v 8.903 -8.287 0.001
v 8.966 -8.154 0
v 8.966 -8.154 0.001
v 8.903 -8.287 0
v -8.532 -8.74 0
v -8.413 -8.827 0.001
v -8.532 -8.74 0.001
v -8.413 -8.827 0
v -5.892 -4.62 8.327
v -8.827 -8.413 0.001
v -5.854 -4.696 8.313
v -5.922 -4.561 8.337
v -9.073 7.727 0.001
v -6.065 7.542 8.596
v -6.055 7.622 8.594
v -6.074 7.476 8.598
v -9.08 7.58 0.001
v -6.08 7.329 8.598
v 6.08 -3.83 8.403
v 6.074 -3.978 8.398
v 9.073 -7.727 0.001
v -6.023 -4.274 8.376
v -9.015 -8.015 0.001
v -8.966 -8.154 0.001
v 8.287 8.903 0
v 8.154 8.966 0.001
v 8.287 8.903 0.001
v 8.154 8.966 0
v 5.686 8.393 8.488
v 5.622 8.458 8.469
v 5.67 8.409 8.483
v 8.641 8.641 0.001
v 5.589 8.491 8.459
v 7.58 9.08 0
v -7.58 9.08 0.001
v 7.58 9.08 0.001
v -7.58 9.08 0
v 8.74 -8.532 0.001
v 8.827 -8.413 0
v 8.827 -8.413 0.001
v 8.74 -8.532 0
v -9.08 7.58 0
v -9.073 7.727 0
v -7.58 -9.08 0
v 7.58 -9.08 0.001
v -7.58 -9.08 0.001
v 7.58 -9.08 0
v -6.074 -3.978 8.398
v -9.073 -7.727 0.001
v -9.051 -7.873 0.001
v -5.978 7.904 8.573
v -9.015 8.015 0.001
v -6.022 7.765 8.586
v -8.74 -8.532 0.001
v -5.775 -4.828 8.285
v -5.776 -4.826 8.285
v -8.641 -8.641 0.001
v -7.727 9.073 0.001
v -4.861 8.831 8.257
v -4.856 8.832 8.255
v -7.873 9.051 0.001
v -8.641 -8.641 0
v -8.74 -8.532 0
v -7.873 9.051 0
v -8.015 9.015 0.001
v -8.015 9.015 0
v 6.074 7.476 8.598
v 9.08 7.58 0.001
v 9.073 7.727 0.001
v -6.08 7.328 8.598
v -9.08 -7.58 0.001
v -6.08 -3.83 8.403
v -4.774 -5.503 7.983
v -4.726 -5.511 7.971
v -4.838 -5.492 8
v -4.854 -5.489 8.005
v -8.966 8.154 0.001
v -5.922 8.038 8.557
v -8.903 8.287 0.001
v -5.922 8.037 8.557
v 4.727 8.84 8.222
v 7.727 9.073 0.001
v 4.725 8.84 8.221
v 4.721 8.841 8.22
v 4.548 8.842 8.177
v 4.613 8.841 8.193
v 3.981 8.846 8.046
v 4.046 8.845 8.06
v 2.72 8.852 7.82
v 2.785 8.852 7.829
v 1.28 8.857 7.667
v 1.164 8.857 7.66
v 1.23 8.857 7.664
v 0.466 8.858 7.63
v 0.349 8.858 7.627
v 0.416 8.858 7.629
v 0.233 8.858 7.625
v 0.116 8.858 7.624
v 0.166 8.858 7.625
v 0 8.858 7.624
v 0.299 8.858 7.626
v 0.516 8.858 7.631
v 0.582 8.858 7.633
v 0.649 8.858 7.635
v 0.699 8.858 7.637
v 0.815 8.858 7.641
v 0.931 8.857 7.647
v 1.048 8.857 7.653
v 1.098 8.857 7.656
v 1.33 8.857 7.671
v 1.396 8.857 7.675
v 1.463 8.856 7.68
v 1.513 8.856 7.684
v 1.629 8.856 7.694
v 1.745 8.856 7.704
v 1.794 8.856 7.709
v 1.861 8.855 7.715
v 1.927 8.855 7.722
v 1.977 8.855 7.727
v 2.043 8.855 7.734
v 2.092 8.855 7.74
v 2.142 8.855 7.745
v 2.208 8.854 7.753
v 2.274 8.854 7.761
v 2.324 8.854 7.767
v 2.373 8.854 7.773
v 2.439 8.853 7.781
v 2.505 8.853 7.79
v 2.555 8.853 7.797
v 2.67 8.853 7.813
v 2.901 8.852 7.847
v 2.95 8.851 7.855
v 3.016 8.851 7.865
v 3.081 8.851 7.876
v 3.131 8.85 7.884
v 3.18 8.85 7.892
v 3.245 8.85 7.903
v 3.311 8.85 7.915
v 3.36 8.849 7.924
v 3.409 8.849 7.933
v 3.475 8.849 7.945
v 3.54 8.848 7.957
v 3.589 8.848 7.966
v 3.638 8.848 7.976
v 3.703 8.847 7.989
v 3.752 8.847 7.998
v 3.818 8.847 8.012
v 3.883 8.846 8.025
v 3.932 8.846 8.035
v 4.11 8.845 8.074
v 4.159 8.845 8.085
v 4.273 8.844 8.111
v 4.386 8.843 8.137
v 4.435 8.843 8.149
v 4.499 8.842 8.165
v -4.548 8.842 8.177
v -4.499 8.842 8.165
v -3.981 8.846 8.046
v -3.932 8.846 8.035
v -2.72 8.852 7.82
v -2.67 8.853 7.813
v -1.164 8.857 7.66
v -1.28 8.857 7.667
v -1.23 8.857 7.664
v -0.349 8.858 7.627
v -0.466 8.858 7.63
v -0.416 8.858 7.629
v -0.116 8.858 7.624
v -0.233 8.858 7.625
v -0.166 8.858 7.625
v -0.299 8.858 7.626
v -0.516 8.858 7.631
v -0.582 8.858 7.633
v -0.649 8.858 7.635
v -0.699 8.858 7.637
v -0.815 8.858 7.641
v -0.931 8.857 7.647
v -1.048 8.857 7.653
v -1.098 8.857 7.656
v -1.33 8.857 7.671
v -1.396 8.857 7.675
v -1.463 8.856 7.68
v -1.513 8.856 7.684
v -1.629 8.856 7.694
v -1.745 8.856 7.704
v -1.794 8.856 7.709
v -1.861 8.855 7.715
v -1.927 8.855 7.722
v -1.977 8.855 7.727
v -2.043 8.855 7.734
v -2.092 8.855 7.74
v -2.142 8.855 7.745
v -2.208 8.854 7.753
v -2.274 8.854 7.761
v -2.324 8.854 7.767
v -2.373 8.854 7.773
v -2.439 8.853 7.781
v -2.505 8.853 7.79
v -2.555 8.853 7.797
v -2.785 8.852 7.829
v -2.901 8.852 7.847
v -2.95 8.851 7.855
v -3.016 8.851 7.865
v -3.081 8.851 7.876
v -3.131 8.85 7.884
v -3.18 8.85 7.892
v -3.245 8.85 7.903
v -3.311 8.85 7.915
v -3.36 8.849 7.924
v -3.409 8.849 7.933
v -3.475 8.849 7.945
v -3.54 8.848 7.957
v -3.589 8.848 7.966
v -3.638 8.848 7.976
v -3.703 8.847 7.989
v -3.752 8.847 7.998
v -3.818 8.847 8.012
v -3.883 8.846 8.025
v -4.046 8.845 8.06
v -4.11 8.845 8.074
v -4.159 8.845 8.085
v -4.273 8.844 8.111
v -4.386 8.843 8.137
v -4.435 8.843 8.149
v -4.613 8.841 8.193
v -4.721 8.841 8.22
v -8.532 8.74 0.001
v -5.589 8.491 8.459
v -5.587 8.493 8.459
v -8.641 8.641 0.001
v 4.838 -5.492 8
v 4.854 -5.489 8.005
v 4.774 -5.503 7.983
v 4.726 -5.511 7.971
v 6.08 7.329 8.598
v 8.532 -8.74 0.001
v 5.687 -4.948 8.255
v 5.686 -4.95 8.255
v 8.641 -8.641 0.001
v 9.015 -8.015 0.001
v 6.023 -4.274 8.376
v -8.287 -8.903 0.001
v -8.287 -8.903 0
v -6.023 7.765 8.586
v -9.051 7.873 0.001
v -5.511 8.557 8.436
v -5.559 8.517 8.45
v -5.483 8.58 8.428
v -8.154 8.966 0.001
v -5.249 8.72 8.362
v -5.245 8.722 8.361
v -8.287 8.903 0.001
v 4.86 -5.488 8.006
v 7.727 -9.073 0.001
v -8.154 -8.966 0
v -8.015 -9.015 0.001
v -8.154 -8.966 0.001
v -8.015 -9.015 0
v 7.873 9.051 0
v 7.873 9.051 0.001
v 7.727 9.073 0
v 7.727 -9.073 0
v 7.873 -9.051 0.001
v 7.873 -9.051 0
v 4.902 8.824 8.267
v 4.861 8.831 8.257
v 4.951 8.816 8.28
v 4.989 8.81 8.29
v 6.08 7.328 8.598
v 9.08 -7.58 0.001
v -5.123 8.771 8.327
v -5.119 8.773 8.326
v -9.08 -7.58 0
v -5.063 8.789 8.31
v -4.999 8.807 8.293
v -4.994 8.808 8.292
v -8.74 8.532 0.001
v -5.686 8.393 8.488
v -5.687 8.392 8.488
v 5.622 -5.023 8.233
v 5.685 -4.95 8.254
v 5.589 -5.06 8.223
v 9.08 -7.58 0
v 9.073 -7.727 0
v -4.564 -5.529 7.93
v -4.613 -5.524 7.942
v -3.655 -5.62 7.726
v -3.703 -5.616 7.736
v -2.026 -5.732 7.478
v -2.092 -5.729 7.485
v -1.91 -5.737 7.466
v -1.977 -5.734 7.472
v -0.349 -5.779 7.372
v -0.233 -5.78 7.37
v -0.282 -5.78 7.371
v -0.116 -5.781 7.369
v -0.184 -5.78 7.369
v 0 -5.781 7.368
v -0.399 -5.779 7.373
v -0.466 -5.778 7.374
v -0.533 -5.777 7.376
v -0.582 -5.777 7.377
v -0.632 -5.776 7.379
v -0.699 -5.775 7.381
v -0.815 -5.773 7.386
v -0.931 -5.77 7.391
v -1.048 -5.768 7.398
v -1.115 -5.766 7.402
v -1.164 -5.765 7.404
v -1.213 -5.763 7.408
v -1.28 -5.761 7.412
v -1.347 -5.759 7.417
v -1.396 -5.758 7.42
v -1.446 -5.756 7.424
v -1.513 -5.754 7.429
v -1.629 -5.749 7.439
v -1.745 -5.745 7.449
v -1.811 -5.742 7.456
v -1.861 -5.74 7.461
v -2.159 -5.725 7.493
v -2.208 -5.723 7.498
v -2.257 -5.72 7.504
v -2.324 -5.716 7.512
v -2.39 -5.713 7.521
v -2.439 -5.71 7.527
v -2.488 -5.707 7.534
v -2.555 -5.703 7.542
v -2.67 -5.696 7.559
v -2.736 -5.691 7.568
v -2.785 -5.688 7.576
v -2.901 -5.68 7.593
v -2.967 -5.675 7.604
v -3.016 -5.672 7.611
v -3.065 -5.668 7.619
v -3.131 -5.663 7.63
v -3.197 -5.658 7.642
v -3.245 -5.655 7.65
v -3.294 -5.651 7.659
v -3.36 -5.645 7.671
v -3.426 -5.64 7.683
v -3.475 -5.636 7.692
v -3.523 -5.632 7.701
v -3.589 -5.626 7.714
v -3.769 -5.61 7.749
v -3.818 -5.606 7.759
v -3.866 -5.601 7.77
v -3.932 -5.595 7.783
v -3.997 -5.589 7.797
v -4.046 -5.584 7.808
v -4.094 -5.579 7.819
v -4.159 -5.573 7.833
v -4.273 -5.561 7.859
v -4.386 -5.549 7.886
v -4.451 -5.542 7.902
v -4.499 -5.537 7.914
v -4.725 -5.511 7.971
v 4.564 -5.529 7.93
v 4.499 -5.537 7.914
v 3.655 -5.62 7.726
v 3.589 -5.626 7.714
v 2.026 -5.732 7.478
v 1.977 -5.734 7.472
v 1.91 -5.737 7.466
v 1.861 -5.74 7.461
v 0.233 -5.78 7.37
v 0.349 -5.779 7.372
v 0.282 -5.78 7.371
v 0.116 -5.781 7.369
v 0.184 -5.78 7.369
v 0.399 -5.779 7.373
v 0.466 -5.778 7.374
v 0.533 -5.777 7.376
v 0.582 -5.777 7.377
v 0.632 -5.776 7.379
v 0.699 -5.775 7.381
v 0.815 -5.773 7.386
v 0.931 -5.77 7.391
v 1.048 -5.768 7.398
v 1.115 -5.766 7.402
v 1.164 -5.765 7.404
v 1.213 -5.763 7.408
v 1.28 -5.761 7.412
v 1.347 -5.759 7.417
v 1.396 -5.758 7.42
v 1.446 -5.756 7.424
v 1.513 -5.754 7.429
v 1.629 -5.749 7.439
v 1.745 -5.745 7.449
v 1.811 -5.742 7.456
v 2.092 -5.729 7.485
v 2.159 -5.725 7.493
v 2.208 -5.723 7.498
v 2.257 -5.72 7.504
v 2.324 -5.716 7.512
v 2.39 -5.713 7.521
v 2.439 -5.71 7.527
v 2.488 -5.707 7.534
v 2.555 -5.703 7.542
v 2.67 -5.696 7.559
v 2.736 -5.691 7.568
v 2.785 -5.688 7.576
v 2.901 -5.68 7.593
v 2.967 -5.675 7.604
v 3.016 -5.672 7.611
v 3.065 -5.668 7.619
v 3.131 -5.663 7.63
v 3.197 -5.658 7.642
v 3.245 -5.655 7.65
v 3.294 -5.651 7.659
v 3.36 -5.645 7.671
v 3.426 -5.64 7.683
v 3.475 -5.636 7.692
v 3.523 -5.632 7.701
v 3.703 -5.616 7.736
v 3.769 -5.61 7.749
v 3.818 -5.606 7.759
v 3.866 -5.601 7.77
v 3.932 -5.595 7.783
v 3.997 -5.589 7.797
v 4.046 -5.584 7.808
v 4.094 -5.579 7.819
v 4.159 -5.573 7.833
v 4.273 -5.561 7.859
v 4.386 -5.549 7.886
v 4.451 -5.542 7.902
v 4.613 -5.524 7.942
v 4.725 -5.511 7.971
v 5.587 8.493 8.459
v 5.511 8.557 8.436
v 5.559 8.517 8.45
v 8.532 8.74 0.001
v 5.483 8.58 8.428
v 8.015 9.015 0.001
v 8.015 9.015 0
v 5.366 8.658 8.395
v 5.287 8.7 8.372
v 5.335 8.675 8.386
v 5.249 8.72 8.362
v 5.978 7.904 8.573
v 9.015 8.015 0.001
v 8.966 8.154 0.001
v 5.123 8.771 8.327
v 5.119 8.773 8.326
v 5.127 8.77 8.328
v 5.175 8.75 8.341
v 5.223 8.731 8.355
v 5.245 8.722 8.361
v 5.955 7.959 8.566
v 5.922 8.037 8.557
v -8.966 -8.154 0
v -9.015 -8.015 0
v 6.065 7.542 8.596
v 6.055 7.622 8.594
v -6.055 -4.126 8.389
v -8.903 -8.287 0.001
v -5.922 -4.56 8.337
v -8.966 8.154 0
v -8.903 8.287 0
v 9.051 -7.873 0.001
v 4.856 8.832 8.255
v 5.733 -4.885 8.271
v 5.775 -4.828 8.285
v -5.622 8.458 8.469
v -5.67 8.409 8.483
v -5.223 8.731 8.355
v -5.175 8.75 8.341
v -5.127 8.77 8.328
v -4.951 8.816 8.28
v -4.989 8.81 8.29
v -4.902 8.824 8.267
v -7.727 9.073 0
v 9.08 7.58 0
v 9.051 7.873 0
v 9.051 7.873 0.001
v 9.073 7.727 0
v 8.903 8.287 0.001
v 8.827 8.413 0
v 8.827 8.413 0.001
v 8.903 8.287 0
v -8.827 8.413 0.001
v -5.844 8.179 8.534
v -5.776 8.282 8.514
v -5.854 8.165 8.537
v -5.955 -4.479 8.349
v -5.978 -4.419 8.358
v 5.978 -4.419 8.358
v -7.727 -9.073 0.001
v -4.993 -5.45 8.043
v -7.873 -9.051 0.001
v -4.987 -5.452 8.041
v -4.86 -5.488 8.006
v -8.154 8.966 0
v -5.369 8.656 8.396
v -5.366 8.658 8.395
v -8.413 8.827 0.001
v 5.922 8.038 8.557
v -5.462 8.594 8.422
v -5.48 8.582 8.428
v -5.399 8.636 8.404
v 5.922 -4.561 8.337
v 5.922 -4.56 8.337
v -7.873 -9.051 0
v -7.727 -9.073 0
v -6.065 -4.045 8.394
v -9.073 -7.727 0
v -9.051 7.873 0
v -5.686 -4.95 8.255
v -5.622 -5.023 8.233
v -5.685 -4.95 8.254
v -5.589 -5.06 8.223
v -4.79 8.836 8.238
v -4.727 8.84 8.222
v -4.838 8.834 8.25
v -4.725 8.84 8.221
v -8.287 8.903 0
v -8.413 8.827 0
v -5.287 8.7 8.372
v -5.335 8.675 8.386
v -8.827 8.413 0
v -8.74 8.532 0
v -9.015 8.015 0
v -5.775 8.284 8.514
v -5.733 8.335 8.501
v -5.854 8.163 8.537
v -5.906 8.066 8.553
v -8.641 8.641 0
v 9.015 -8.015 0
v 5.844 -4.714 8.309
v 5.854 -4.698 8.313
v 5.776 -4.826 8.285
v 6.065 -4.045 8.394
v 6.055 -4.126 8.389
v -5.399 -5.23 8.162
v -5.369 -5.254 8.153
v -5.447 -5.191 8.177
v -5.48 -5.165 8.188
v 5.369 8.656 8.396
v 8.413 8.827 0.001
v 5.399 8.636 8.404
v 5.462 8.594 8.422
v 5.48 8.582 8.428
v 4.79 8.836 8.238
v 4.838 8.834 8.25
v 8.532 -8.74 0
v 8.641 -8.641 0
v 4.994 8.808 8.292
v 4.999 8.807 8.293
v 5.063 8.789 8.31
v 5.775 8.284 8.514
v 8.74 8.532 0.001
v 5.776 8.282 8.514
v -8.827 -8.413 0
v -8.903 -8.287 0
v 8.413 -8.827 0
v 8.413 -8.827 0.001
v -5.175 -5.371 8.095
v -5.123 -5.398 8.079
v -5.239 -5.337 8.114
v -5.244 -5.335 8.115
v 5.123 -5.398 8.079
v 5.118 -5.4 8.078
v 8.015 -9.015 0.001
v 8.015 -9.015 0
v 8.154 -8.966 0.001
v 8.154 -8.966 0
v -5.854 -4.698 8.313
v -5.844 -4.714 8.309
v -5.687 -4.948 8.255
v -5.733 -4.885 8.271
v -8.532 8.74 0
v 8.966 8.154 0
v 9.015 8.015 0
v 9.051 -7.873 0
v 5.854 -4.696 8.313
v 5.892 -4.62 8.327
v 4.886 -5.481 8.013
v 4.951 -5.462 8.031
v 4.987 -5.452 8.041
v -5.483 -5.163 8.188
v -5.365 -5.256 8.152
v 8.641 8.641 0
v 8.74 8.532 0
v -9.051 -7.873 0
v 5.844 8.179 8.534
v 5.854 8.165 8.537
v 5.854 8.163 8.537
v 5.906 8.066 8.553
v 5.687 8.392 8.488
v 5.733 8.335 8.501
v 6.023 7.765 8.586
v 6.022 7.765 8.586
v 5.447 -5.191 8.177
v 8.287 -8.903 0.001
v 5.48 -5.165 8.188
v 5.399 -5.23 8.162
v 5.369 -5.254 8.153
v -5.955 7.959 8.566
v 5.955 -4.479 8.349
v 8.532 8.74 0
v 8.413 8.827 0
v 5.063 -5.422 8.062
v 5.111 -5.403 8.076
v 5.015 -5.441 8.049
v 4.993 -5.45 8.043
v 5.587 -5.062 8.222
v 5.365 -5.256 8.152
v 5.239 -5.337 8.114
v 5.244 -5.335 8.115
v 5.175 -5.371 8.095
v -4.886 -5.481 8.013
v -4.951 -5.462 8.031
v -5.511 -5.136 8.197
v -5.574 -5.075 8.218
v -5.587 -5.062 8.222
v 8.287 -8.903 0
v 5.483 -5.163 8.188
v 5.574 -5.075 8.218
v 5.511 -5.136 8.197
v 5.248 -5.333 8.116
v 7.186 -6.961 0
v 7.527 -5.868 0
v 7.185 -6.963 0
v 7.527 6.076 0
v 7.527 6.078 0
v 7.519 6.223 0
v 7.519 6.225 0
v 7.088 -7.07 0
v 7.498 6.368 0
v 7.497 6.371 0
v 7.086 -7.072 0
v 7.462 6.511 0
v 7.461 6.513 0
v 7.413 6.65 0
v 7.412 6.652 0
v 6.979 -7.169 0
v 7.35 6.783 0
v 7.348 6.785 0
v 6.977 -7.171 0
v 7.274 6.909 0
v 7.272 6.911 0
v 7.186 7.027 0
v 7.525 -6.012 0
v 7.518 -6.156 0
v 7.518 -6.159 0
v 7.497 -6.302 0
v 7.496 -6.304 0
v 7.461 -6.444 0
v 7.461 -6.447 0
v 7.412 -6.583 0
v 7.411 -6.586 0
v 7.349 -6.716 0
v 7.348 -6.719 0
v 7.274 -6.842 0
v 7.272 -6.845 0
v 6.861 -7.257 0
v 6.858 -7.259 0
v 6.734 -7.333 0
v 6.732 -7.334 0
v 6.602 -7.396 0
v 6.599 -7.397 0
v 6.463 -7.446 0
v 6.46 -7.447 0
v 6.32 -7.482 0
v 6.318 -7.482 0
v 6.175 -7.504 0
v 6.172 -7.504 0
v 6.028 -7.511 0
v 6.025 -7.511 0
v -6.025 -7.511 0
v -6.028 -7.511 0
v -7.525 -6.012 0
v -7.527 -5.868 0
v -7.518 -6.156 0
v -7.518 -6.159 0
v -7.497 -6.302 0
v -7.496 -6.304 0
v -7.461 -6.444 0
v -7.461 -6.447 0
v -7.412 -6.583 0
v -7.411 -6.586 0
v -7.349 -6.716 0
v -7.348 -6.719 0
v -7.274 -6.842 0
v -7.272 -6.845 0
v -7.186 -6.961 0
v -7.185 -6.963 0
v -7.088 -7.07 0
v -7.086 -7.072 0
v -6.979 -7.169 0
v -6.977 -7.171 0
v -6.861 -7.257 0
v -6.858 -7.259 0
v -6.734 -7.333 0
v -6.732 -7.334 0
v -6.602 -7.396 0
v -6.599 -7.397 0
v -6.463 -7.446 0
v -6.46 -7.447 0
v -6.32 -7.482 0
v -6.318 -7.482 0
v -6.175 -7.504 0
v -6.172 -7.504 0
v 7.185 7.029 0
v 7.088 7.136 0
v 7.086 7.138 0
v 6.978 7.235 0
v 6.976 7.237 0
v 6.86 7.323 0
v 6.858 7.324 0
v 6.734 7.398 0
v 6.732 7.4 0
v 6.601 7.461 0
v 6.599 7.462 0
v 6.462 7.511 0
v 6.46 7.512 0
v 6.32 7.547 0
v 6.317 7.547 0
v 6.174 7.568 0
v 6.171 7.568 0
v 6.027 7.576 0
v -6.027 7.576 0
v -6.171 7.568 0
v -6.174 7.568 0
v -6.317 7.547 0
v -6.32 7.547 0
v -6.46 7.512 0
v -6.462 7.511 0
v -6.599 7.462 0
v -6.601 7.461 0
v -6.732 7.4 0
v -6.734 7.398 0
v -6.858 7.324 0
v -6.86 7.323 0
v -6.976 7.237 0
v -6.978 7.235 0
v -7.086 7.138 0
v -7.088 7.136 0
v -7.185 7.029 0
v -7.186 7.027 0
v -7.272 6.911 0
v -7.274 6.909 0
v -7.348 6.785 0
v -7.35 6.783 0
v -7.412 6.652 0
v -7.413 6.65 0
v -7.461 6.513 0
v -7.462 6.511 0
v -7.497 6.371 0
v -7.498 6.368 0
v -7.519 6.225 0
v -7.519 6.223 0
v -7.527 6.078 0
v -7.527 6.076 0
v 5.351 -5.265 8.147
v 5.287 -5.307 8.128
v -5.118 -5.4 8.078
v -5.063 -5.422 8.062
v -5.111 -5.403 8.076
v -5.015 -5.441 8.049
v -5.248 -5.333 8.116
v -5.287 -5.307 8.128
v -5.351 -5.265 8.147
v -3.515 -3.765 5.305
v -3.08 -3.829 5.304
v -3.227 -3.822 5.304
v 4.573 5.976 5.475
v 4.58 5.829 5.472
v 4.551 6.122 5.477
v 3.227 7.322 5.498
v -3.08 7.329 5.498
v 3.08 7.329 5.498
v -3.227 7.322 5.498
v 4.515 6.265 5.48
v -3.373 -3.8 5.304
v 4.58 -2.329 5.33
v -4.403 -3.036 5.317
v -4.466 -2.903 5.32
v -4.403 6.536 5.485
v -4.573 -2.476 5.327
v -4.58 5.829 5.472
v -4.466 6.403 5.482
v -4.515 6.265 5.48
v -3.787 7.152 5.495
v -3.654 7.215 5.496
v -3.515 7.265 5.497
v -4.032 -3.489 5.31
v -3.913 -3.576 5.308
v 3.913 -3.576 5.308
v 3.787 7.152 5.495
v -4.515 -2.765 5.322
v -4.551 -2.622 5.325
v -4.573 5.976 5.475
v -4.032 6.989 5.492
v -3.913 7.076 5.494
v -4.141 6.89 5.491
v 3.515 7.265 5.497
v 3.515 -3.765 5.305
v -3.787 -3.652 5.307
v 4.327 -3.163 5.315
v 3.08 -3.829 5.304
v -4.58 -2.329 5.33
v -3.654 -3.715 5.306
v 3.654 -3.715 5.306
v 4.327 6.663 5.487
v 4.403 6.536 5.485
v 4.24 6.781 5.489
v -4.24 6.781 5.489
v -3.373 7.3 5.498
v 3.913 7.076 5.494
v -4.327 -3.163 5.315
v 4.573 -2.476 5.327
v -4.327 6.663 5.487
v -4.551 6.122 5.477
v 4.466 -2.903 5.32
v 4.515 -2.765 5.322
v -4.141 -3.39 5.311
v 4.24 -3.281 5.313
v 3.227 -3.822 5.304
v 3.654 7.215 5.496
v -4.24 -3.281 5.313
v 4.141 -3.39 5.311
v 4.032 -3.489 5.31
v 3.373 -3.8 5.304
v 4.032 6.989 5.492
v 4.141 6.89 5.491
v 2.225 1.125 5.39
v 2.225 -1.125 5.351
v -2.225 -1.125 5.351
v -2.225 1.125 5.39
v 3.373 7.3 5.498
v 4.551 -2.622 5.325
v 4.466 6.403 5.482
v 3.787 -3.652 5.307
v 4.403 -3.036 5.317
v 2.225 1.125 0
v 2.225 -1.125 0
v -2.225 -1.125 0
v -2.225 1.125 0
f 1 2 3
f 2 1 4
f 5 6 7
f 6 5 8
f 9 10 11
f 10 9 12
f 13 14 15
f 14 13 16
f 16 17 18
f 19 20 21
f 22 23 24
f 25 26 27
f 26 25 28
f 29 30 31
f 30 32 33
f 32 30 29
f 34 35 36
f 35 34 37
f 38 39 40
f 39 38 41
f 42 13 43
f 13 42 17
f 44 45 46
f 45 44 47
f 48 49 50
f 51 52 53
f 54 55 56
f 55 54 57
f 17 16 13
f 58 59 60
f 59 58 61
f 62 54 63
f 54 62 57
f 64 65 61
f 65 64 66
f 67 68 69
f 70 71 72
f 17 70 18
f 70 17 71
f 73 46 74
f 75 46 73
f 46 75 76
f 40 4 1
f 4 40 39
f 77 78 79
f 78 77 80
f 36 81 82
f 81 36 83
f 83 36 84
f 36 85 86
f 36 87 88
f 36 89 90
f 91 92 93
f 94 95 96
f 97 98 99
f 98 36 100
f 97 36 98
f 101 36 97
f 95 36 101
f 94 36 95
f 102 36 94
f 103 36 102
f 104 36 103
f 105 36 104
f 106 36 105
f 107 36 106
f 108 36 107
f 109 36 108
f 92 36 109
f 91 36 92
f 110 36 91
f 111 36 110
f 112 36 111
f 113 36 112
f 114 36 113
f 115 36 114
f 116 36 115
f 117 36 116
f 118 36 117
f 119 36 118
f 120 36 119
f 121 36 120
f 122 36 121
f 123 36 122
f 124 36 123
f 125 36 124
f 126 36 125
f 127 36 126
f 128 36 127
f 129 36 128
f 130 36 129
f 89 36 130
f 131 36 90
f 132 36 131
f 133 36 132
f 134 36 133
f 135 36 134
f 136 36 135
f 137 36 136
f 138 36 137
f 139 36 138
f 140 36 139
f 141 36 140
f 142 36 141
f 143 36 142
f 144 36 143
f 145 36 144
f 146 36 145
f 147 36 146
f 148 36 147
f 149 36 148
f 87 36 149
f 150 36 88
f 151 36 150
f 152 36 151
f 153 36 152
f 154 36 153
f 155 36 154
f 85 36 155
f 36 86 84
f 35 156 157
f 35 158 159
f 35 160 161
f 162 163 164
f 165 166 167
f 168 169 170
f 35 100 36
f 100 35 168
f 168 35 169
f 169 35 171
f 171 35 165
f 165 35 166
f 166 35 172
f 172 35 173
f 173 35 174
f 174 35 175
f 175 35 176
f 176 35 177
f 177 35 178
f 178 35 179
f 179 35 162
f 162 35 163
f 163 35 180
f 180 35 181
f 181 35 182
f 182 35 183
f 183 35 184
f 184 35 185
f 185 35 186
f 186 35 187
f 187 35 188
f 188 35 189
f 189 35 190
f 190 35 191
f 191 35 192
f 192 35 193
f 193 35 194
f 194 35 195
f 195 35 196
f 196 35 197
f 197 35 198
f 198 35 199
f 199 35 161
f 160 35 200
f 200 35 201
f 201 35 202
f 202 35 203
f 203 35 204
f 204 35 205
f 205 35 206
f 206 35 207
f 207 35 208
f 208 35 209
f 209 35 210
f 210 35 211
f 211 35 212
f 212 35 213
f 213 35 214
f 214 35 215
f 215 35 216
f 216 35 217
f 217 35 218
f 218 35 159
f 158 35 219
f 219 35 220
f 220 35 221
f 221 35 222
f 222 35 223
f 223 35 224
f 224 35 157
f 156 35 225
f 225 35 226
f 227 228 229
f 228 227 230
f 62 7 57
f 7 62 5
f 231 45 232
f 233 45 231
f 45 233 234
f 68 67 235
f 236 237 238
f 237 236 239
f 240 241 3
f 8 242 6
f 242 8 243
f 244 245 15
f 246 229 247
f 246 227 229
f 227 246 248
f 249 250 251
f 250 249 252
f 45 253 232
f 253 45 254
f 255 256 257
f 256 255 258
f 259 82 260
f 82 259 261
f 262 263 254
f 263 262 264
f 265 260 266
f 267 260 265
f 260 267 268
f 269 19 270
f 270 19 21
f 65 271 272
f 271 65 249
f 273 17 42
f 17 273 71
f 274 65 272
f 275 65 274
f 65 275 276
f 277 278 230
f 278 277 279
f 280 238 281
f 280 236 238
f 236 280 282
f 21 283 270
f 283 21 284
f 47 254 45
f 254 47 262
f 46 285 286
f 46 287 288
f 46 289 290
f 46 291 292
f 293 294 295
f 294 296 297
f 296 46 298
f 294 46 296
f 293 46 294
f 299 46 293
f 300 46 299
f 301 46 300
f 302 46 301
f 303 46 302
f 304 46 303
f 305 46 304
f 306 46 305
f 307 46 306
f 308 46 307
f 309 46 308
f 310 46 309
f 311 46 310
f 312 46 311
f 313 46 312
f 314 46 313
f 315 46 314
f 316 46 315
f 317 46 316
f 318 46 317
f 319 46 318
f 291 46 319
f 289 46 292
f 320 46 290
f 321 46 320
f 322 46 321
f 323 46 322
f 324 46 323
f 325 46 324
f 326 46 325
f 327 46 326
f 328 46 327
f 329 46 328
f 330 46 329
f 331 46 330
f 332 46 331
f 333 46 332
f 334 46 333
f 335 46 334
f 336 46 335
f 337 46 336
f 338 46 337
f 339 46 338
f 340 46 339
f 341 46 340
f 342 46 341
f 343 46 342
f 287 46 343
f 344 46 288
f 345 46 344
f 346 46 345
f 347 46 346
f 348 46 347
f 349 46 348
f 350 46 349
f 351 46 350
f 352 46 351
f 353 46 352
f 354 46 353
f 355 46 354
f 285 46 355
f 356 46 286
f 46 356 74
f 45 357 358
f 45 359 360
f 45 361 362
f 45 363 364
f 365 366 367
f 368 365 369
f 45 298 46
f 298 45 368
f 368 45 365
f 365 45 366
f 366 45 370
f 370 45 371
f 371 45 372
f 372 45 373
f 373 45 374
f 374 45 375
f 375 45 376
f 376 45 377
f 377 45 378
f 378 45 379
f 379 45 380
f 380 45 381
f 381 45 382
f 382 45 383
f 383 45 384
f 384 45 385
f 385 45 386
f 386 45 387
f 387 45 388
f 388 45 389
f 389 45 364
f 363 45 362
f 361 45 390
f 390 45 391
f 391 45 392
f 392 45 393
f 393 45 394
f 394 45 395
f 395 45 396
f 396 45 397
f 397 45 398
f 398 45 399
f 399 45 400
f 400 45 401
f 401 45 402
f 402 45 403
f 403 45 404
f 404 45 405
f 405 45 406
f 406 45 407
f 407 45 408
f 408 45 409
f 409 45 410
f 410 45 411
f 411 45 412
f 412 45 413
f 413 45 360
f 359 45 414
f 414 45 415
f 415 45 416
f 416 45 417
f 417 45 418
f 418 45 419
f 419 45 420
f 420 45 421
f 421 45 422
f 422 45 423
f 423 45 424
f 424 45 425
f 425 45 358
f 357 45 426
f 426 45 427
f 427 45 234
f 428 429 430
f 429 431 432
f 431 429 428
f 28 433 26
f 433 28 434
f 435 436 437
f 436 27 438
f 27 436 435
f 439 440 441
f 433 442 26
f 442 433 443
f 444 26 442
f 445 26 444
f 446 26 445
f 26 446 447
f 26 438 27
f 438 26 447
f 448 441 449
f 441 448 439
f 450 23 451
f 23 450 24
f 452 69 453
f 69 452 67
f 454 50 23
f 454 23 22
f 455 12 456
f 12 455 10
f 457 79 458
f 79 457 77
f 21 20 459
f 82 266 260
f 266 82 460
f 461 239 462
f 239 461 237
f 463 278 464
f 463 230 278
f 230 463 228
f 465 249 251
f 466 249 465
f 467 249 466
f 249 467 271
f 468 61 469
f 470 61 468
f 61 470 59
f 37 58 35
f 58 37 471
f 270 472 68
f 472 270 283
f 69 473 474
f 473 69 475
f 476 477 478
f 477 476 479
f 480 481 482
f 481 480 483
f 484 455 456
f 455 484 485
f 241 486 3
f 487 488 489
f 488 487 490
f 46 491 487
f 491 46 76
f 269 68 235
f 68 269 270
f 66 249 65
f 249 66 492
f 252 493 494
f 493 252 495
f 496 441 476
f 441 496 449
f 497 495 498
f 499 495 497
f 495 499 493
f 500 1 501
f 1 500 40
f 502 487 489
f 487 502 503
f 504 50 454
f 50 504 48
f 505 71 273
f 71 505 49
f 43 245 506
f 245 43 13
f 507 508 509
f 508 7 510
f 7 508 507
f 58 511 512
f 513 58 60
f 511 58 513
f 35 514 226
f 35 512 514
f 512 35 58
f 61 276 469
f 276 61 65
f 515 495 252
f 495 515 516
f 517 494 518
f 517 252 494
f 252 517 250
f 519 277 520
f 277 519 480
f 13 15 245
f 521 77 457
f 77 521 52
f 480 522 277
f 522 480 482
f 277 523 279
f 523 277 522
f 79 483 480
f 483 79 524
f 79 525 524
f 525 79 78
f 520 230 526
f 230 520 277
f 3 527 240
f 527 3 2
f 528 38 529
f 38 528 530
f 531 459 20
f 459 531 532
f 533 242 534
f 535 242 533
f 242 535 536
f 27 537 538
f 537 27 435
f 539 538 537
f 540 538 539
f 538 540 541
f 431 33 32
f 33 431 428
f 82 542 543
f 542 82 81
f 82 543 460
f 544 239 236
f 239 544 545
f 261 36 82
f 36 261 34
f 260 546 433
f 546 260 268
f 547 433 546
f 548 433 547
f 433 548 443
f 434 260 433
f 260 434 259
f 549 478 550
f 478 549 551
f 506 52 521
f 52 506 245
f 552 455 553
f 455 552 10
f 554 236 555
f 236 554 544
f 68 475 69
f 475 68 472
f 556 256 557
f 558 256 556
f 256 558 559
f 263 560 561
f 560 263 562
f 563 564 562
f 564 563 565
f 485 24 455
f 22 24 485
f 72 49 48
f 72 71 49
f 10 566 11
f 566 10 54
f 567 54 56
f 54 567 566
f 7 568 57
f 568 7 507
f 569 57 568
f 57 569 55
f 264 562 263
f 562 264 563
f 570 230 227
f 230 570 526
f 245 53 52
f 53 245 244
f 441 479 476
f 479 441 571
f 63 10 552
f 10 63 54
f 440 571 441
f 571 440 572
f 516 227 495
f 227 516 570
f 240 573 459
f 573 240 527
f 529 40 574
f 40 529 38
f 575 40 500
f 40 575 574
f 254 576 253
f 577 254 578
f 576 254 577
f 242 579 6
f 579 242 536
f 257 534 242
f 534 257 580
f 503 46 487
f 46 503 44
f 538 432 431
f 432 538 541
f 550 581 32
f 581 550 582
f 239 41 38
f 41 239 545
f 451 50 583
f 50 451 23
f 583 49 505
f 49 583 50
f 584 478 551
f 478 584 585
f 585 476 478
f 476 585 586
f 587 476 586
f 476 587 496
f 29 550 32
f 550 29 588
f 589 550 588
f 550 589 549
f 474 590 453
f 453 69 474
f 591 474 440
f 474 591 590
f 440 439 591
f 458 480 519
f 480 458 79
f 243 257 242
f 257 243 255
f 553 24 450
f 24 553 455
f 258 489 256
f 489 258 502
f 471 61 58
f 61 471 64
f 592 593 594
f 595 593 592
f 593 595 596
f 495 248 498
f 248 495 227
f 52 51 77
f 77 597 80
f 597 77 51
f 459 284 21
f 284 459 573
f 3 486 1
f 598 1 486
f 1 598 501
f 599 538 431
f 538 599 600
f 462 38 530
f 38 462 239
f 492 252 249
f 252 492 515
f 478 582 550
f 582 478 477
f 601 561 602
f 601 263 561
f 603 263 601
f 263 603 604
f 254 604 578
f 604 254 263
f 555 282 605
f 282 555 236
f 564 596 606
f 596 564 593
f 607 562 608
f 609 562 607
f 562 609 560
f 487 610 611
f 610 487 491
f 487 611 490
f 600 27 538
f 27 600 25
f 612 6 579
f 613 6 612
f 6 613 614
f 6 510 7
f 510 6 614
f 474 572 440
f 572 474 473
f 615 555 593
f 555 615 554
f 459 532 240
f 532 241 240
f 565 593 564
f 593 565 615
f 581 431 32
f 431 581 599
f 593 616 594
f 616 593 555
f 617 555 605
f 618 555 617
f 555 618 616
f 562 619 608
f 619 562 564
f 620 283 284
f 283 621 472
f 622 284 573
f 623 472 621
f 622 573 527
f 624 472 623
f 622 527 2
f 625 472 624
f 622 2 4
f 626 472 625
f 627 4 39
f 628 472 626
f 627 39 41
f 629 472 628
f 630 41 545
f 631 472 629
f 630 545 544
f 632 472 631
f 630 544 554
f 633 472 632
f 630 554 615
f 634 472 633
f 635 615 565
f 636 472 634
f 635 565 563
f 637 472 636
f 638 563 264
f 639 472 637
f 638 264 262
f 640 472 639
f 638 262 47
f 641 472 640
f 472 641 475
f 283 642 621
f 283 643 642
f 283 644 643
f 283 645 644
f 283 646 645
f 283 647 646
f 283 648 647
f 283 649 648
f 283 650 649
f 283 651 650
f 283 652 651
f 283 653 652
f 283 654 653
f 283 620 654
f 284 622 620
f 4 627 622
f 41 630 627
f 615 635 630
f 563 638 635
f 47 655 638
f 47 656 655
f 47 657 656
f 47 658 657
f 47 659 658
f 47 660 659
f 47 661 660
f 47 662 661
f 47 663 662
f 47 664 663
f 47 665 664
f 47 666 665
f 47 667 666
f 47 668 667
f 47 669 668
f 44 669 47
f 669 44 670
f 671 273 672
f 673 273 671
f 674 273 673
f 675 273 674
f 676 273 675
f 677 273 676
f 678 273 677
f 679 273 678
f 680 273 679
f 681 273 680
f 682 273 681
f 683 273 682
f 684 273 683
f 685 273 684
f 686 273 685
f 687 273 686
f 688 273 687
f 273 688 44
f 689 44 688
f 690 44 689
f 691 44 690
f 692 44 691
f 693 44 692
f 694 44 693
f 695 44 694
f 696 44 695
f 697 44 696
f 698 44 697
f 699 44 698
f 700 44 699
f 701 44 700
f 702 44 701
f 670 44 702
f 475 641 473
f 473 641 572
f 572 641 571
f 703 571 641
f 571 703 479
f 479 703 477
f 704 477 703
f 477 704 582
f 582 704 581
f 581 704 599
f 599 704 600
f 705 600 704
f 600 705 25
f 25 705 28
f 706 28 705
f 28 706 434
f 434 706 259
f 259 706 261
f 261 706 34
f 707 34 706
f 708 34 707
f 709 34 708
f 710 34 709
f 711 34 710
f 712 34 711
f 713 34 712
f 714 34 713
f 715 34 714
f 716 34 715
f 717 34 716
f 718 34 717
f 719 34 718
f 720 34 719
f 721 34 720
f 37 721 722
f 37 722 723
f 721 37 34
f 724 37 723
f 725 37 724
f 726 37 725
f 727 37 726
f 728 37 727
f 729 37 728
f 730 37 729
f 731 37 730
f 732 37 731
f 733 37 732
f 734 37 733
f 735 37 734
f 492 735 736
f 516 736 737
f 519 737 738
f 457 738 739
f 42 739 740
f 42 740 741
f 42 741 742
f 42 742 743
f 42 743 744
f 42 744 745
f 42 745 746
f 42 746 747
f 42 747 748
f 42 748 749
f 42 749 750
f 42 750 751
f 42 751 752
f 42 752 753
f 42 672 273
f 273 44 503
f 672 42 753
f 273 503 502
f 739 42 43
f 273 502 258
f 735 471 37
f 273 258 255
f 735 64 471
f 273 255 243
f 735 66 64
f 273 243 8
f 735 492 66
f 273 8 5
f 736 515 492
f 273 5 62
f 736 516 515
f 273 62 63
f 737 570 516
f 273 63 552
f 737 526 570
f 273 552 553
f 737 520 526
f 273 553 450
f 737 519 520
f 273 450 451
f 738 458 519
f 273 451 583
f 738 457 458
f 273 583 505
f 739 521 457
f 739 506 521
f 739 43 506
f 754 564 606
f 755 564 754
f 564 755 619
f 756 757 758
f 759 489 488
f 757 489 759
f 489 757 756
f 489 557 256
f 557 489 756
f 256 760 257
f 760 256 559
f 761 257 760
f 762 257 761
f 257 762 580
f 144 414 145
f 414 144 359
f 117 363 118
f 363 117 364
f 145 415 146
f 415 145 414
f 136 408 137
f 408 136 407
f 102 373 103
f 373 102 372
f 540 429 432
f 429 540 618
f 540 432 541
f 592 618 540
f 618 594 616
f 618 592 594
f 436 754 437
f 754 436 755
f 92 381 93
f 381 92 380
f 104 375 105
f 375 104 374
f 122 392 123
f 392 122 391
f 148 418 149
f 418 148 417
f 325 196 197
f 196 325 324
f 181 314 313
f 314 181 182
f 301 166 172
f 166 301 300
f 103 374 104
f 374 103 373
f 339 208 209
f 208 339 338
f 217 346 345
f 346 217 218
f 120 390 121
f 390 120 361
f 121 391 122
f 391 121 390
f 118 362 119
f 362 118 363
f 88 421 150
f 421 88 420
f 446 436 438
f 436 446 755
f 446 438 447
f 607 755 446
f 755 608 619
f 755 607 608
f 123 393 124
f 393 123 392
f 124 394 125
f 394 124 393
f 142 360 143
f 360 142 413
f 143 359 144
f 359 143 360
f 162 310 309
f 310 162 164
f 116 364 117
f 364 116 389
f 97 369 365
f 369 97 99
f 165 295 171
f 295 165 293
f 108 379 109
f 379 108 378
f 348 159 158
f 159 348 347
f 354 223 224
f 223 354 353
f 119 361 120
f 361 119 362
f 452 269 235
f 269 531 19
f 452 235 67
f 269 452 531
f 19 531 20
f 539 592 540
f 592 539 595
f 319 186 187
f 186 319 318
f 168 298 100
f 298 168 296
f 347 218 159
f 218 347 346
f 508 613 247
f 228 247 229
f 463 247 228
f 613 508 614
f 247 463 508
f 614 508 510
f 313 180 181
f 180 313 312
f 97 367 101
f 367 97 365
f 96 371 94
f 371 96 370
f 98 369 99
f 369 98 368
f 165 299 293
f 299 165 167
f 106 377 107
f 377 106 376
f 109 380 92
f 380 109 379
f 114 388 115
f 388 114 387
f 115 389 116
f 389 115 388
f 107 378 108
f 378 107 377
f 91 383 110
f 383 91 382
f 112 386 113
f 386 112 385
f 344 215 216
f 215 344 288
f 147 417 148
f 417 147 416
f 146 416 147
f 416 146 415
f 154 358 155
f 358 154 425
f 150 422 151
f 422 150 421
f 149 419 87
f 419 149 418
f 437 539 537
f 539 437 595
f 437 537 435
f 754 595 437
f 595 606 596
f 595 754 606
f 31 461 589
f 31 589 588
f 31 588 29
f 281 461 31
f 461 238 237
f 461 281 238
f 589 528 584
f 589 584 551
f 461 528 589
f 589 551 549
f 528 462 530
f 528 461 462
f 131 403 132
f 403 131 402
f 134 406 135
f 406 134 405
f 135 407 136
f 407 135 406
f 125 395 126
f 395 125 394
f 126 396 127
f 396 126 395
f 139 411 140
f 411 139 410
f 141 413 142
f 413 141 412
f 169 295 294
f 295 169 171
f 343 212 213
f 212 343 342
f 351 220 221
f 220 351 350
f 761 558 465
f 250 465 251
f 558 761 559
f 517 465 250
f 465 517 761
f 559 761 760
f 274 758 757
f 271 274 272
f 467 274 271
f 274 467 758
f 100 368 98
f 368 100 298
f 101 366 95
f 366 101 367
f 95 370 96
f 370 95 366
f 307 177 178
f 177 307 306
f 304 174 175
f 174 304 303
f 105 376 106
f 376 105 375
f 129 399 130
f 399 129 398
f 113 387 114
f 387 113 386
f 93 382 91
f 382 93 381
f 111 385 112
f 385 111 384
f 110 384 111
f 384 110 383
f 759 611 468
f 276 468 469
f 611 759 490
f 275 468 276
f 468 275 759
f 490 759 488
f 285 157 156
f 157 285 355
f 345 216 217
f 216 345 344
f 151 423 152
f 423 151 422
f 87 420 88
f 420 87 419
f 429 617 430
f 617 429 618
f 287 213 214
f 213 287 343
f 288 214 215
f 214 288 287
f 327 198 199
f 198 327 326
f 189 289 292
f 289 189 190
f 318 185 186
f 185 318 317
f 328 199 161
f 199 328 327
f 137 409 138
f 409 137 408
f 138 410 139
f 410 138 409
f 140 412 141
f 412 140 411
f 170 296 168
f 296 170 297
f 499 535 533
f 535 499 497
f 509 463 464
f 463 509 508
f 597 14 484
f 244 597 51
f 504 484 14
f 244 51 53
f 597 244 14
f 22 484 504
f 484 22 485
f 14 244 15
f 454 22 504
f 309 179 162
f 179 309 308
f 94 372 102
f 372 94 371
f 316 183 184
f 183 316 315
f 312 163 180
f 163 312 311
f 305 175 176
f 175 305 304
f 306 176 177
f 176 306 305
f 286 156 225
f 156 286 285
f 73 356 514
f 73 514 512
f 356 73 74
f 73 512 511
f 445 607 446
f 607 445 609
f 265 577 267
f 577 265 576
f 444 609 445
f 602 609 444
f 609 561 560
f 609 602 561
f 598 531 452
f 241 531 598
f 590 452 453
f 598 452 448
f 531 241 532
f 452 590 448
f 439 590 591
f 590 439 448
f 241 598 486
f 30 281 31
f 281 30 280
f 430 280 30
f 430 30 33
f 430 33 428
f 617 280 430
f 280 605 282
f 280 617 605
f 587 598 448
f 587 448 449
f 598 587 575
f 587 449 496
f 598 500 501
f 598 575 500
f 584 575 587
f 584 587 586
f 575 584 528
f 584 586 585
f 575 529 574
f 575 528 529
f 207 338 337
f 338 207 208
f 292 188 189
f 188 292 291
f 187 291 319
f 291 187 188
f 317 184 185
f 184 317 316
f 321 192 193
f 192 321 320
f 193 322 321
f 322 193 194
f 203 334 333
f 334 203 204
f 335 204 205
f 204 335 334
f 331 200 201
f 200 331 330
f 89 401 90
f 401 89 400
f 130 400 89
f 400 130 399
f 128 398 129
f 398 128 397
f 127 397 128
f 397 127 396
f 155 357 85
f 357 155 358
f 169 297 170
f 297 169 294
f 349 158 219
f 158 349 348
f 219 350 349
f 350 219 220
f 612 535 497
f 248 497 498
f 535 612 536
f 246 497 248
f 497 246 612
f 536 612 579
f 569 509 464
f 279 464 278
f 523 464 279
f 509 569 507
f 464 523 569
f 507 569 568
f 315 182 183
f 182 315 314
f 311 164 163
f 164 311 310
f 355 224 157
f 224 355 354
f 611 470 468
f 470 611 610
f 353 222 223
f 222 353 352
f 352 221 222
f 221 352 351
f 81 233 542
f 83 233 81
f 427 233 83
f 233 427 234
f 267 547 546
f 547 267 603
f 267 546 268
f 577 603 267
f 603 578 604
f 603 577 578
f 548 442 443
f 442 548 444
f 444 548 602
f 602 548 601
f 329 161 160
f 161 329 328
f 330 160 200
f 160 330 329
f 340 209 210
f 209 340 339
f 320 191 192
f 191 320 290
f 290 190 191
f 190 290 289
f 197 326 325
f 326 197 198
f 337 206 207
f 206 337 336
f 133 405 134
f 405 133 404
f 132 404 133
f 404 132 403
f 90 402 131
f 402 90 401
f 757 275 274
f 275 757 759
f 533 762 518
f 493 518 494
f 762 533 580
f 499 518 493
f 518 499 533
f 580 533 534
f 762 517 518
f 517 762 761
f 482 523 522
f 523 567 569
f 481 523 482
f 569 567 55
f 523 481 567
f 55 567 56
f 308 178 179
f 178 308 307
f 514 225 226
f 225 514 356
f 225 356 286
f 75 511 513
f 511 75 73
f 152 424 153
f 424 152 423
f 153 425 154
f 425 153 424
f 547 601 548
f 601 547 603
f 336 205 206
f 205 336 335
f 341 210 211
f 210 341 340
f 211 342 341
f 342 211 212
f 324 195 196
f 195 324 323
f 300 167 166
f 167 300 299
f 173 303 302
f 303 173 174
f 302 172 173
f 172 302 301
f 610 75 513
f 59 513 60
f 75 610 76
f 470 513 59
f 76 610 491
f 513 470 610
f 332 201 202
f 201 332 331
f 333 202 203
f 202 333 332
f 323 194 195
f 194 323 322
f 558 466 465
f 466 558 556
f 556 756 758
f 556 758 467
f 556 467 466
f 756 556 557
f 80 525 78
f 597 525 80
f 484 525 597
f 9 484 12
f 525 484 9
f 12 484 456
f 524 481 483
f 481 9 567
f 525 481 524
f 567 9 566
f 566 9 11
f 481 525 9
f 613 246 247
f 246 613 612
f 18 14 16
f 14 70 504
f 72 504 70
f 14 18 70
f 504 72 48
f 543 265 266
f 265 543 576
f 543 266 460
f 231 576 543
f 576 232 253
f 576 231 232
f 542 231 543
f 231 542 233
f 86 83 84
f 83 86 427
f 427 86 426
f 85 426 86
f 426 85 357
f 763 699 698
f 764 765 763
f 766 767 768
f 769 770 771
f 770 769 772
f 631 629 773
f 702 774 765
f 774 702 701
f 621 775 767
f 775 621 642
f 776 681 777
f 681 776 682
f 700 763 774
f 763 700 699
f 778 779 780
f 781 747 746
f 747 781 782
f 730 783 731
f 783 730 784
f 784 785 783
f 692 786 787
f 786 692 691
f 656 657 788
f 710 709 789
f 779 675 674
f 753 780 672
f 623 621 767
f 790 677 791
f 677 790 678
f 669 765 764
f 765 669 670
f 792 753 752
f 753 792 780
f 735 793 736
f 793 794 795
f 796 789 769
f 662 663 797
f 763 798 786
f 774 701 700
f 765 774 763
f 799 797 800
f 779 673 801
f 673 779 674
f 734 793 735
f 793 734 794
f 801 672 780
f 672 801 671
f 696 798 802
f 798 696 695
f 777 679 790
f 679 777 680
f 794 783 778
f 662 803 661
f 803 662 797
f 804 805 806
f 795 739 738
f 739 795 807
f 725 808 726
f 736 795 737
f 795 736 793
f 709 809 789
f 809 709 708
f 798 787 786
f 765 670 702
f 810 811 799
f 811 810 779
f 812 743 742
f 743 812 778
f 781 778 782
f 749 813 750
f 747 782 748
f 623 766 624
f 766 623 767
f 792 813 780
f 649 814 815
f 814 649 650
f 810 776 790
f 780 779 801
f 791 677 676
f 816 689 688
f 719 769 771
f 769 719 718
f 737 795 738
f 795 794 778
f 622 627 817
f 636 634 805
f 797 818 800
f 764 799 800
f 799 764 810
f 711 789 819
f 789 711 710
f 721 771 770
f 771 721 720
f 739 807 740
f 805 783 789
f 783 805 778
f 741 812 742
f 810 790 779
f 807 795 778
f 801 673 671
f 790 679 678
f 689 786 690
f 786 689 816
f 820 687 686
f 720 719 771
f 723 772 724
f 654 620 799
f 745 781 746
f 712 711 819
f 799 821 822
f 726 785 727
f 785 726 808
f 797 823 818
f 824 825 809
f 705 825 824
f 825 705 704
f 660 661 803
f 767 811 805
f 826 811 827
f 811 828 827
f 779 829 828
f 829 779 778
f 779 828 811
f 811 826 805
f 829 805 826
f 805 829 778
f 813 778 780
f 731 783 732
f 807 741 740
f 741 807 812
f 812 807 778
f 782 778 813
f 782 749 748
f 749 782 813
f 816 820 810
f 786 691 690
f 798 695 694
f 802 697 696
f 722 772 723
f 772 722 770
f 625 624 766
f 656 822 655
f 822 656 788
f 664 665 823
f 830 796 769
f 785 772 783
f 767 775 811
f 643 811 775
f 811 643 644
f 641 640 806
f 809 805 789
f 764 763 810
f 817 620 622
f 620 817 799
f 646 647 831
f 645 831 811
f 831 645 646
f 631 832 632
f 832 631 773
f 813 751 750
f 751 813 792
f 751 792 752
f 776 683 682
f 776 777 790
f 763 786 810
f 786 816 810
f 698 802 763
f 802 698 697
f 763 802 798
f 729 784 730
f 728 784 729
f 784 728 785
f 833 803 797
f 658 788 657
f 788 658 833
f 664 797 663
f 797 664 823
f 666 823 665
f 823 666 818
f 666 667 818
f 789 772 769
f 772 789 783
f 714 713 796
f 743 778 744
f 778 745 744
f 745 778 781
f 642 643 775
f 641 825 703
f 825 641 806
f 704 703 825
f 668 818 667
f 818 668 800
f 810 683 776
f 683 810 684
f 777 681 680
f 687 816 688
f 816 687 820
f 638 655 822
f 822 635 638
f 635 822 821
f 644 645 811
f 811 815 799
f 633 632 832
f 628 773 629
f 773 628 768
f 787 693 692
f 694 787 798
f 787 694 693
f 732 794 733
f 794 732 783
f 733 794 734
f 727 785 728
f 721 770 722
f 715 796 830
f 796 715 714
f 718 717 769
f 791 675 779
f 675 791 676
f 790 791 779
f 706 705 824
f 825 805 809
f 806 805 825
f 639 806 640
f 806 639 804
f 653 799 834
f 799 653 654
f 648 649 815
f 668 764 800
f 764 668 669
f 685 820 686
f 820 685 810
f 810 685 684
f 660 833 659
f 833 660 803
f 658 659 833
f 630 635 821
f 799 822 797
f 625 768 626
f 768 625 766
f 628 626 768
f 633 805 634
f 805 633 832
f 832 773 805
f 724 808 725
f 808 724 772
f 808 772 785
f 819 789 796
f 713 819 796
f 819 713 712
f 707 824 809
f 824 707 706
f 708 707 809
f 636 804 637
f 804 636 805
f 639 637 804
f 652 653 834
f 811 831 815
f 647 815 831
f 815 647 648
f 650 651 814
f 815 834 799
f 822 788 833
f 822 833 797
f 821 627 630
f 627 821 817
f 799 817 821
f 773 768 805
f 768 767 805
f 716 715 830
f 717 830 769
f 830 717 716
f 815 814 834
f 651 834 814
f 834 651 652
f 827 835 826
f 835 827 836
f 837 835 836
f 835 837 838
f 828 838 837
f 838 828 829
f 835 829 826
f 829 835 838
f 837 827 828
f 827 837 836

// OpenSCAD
// Row 5? Cherry MX key
//change to round things better
$fn = 64;

//scale of inner to outer shape
key_wall_thickness_width =  .8;
key_wall_thickness_height = .8;
key_wall_thickness_depth =  .8;
//length in units of key
key_length = 1;


//connector brim
//enable brim for connector
has_brim = 0;
//brim radius. 11 ensconces normal keycap stem in normal keycap
brim_radius = 11;
//brim depth
brim_depth = .3;



//whether stabilizer connectors are enabled
stabilizers = 0;

//stabilizer distance
stabilizer_distance = 50;

inverted_dish = 0;

//keycap type, [0..11]
key_profile = 1;

//profile specific stuff

/*god, I would love a class right here
 here we have, for lack of a better implementation, an array
 that defines the more intimate aspects of a key.
 order is thus:
 1. Bottom Key Width: width of the immediate bottom of the key
 2. Bottom Key Height: height of the immediate bottom of the key
 3. Top Key Width Difference: mm to subtract from bottom key width to create top key width
 4. Top Key Height Difference: mm to subtract from bottom key height to create top key height
 5. total Depth: how tall the total in the switch is before dishing
 6. Top Tilt: X rotation of the top. Top and dish obj are rotated
 7. Top Skew: Y skew of the top of the key relative to the bottom. DCS has some, DSA has none (its centered)
 8. Dish Type: type of dishing. currently sphere and cylinder
 9. Dish Depth: how many mm to cut into the key with
 10. Dish Radius: radius of dish obj, the Sphere or Cylinder that cuts into the keycap
*/

key_profiles = [

	//DCS Profile

	[ //DCS ROW 5...erm...ish
		18.16,  // Bottom Key Width
		18.16,  // Bottom Key Height
		6,   // Top Key Width Difference
		4,   // Top Key Height Difference
		11.5, // total Depth
		-6,  // Top Tilt
		1.75,// Top Skew

		//Dish Profile

		0,   // Dish Type
		1,   // Dish Depth
		0,   // Dish Skew X
		0    // DIsh Skew Y
	],
	[ //DCS ROW 1
		18.16,  // Bottom Key Width
		18.16,  // Bottom Key Height
		6,   // Top Key Width Difference
		4,   // Top Key Height Difference
		8.5, // total Depth
		-1,  // Top Tilt
		1.75,// Top Skew

		//Dish Profile

		0,   // Dish Type
		1,   // Dish Depth
		0,   // Dish Skew X
		0    // DIsh Skew Y
	],
	[ //DCS ROW 2
		18.16,  // Bottom Key Width
		18.16,  // Bottom Key Height
		6.2,   // Top Key Width Difference
		4,   // Top Key Height Difference
		7.5, // total Depth
		3,  // Top Tilt
		1.75,// Top Skew

		//Dish Profile

		0,   // Dish Type
		1,   // Dish Depth
		0,   // Dish Skew X
		0    // DIsh Skew Y
	],
	[ //DCS ROW 3
		18.16,  // Bottom Key Width
		18.16,  // Bottom Key Height
		6,   // Top Key Width Difference
		4,   // Top Key Height Difference
		6.2, // total Depth
		7,  // Top Tilt
		1.75,// Top Skew

		//Dish Profile

		0,   // Dish Type
		1,   // Dish Depth
		0,   // Dish Skew X
		0    // DIsh Skew Y
	],
	[ //DCS ROW 4
		18.16,  // Bottom Key Width
		18.16,  // Bottom Key Height
		6,   // Top Key Width Difference
		4,   // Top Key Height Difference
		6.2, // total Depth
		16,  // Top Tilt
		1.75,// Top Skew

		//Dish Profile

		0,   // Dish Type
		1,   // Dish Depth
		0,   // Dish Skew X
		0    // DIsh Skew Y
	],

	//DSA Profile

	[ //DSA ROW 3
	  18.4,  // Bottom Key Width
	  18.4,  // Bottom Key Height
	  5.7, // Top Key Width Difference
	  5.7, // Top Key Height Difference
	  7.4, // total Depth
	  0,   // Top Tilt
	  0,   // Top Skew

	  //Dish Profile

	  1,   // Dish Type
	  1.2, // Dish Depth
	  0,   // Dish Skew X
	  0    // DIsh Skew Y
	],

	//SA Proile

	[ //SA ROW 1
		18.4,  // Bottom Key Width
	  18.4,  // Bottom Key Height
	  5.7, // Top Key Width Difference
	  5.7, // Top Key Height Difference
	  13.73, // total Depth, fudged
	  0,   // Top Tilt
	  0,   // Top Skew

	  //Dish Profile

	  1,   // Dish Type
	  2, // Dish Depth
	  0,   // Dish Skew X
	  0    // DIsh Skew Y
	],
	[ //SA ROW 2
		18.4,  // Bottom Key Width
	  18.4,  // Bottom Key Height
	  5.7, // Top Key Width Difference
	  5.7, // Top Key Height Difference
	  11.73, // total Depth
	  0,   // Top Tilt
	  0,   // Top Skew

	  //Dish Profile

	  1,   // Dish Type
	  2, // Dish Depth
	  0,   // Dish Skew X
	  0    // DIsh Skew Y
	],
	[ //SA ROW 3
		18.4,  // Bottom Key Width
	  18.4,  // Bottom Key Height
	  5.7, // Top Key Width Difference
	  5.7, // Top Key Height Difference
	  11.73, // total Depth
	  0,   // Top Tilt
	  0,   // Top Skew

	  //Dish Profile

	  1,   // Dish Type
	  1.6, // Dish Depth
	  0,   // Dish Skew X
	  0    // DIsh Skew Y
	],
	[ //SA ROW 4
		18.4,  // Bottom Key Width
	  18.4,  // Bottom Key Height
	  5.7, // Top Key Width Difference
	  5.7, // Top Key Height Difference
	  11.73, // total Depth
	  0,   // Top Tilt
	  0,   // Top Skew

	  //Dish Profile

	  1,   // Dish Type
	  2, // Dish Depth
	  0,   // Dish Skew X
	  0    // DIsh Skew Y
	],
	[ //DCS ROW 2 SPACEBAR
		18.16,  // Bottom Key Width
		18.16,  // Bottom Key Height
		6.2,   // Top Key Width Difference
		4,   // Top Key Height Difference
		7.5, // total Depth
		3,  // Top Tilt
		1.75,// Top Skew

		//Dish Profile

		2,   // Dish Type
		1,   // Dish Depth
		0,   // Dish Skew X
		0    // DIsh Skew Y
	],
	[ //DCS ROW 4 SPACEBAR (ORIGINAL)
		18.16,  // Bottom Key Width
		18.16,  // Bottom Key Height
		6,   // Top Key Width Difference
		4,   // Top Key Height Difference
		6.2, // total Depth
		16,  // Top Tilt
		1.75,// Top Skew

		//Dish Profile

		2,   // Dish Type
		1,   // Dish Depth
		0,   // Dish Skew X
		0    // DIsh Skew Y
	],
];

stem_profile=1;

//libraries. they generate geometry
//that is used by other things to generate features

//centered
module roundedRect(size, radius) {
	x = size[0];
	y = size[1];
	z = size[2];

	translate([-x/2,-y/2,0])
	linear_extrude(height=z)
	hull() {
		translate([radius, radius, 0])
		circle(r=radius);

		translate([x - radius, radius, 0])
		circle(r=radius);

		translate([x - radius, y - radius, 0])
		circle(r=radius);

		translate([radius, y - radius, 0])
		circle(r=radius);
	}
}


//bottom we can use to anchor things
module inside(key_profile)
{
	difference(){
		translate([0,0,50])
		cube([100,100,100],center=true);

		translate([0,0,-.1])
		shape(key_profile, 3);
	}
}

module cherry_stem(){
	// cross length
	cross_length = 4.4;
	//dimensions of connector
	// outer cross extra length in x
	extra_outer_cross_width = 2.11;
	// outer cross extra length in y
	extra_outer_cross_height = 1.1;
	// dimensions of cross
	// horizontal cross bar width
	horizontal_cross_width = 1.4;
	// vertical cross bar width
	vertical_cross_width = 1.3;
	//extra vertical cross length - the extra length of the up/down bar of the cross
	extra_vertical_cross_length = 1.1;
	// cross depth, stem height is 3.4mm
	cross_depth = 4;

	difference(){
		union(){
			translate(
				[
		 			-(cross_length+extra_outer_cross_width)/2,
		 			-(cross_length+extra_outer_cross_height)/2,
		 			0
				]
			)
			cube( // the base of the stem, the part the cruciform digs into
				[
					cross_length+extra_outer_cross_width,
					cross_length+extra_outer_cross_height,
					50
				]
			);
			if (has_brim == 1){ cylinder(r=brim_radius,h=brim_depth); }
		}
		//the cross part of the steam
		translate([0,0,(cross_depth)/2]){
	        cube([vertical_cross_width,cross_length+extra_vertical_cross_length,cross_depth], center=true );//remove +2 to print with cross
	        cube([cross_length,horizontal_cross_width,cross_depth], center=true );
	    }
	}
}

module alps_stem(){
	cross_depth = 40;
	width = 4.45;
	height = 2.25;

	base_width = 12;
	base_height = 15;

	//translate([0,0,cross_depth + 50/2]) cube([base_width, base_height, 50], center=true);
	translate([0,0,(cross_depth/2)]){
		cube([width,height,cross_depth], center = true);
	}


}

//whole connector
module connector(key_profile,has_brim){
	difference(){
		//TODO can I really not do an array index here?
		if(stem_profile==0) cherry_stem();
		if(stem_profile==1) alps_stem();
		inside(key_profile);
	}
}

//stabilizer connectors 
module stabilizer_connectors(key_profile,has_brim){
	translate([stabilizer_distance,0,0]) connector(key_profile, has_brim);
	translate([-stabilizer_distance,0,0]) connector(key_profile, has_brim);
}

//i h8 u scad
module shape(key_profile, thickness){

	bottom_key_width = key_profile[0] ;
	bottom_key_height = key_profile[1];
	top_key_width_difference = key_profile[2];
	top_key_height_difference = key_profile[3];
	total_depth = key_profile[4] - thickness;
	top_tilt = key_profile[5];
	top_skew = key_profile[6];

    if (inverted_dish == 1){
		difference(){
			union(){
				shape_hull(key_profile, thickness, 1);
				dish(key_profile, thickness);
			}
			outside(key_profile, thickness);
		}
	}
	else{
		difference(){
			shape_hull(key_profile, thickness, 1);	
			dish(key_profile, thickness);
		}
	}
}

//conicalish clipping shape to trim things off the outside of the keycap
module outside(key_profile, thickness){
	difference(){
		cube([100000,100000,100000],center = true);
		shape_hull(key_profile, thickness, 2);
	}
}

//super basic hull shape without dish
module shape_hull(key_profile, thickness, modifier){
	bottom_key_width = key_profile[0] ;
	bottom_key_height = key_profile[1];
	top_key_width_difference = key_profile[2];
	top_key_height_difference = key_profile[3];
	total_depth = key_profile[4] - thickness;
	top_tilt = key_profile[5];
	top_skew = key_profile[6];

	hull(){
		roundedRect([bottom_key_width*key_length - thickness,bottom_key_height - thickness,.001],1.5);

		translate([0,top_skew,total_depth * modifier])
		rotate([-top_tilt,0,0])
		roundedRect([bottom_key_width*key_length - thickness -top_key_width_difference * modifier,bottom_key_height - thickness -top_key_height_difference * modifier,.001],1.5);
	}
}
//end libraries

//dish selector
module dish(key_profile){ //this thing is a monster
	// names, so I don't go crazy
	total_key_width = key_profile[0];
	total_key_height = key_profile[1];
	width_difference = key_profile[2];
	height_difference = key_profile[3];
	total_depth = key_profile[4];
	top_tilt = key_profile[5];
	top_skew = key_profile[6];
	dish_type = key_profile[7];
	dish_depth = key_profile[8];
	dish_skew_x = key_profile[9];
	dish_skew_y = key_profile[10];

	//dependant variables
	key_width = total_key_width * key_length - width_difference;
	key_height = total_key_height - height_difference;

	if(dish_type == 0){ // cylindrical dish
		/* we do some funky math here
		 * basically you want to have the dish "dig in" to the keycap x millimeters
		 * in order to do that you have to solve a small (2d) system of equations
		 * where the chord of the spherical cross section of the dish is
		 * the width of the keycap.
		 */
		// the distance you have to move the dish up so it digs in dish_depth millimeters
		chord_length = (pow(key_width, 2) - 4 * pow(dish_depth, 2)) / (8 * dish_depth);
		//the radius of the dish
		rad = (pow(key_width, 2) + 4 * pow(dish_depth, 2)) / (8 * dish_depth);

		if (inverted_dish == 1){
			translate([dish_skew_x, top_skew + dish_skew_y, total_depth])
			rotate([90-top_tilt,0,0])
			translate([0,-chord_length,0])
			cylinder(h=100,r=rad, $fn=1024, center=true);
		}
		else{
			translate([dish_skew_x, top_skew + dish_skew_y, total_depth])
			rotate([90-top_tilt,0,0])
			translate([0,chord_length,0])
			cylinder(h=100,r=rad, $fn=1024, center=true);
		}
	}
	else if (dish_type == 1) { // spherical dish
		//same thing here, but we need the corners to just touch - so we have to find the hypotenuse of the top
		chord = pow((pow(key_width,2) + pow(key_height, 2)),0.5); //getting diagonal of the top

		// the distance you have to move the dish up so it digs in dish_depth millimeters
		chord_length = (pow(chord, 2) - 4 * pow(dish_depth, 2)) / (8 * dish_depth);
		//the radius of the dish
		rad = (pow(chord, 2) + 4 * pow(dish_depth, 2)) / (8 * dish_depth);

		if (inverted_dish == 1){
			translate([dish_skew_x, top_skew + dish_skew_y, total_depth])
			translate([0,0,-chord_length])
			sphere(r=rad, $fn=256);
		}
		else{
			translate([dish_skew_x, top_skew + dish_skew_y, total_depth])
			translate([0,0,chord_length])
			sphere(r=rad, $fn=256);
		}
	}
	else if (dish_type == 2){// SIDEWAYS cylindrical dish - used for spacebar

		chord_length = (pow(key_height, 2) - 4 * pow(dish_depth, 2)) / (8 * dish_depth);
		rad = (pow(key_height, 2) + 4 * pow(dish_depth, 2)) / (8 * dish_depth);

		if (inverted_dish == 1){
			translate([dish_skew_x, top_skew + dish_skew_y, total_depth])
			rotate([90,top_tilt,90])
			translate([0,-chord_length,0])
			cylinder(h=key_width + 20,r=rad, $fn=1024, center=true); // +20 just cuz
		}
		else{
			translate([dish_skew_x, top_skew + dish_skew_y, total_depth])
			rotate([90,top_tilt,90])
			translate([0,chord_length,0])
			cylinder(h=key_width + 20,r=rad, $fn=1024, center=true);
		}
	}
}

//actual full key with space carved out and keystem/stabilizer connectors
module key(key_profile){
	union(){
		difference(){
			shape(key_profile, 0);

			translate([0,0,-.1])
			shape(key_profile, 3);
		}
		connector(key_profile,has_brim);
		if (stabilizers == 1){
			stabilizer_connectors(key_profile,has_brim);
		}
	}
}


key(key_profiles[key_profile]);
